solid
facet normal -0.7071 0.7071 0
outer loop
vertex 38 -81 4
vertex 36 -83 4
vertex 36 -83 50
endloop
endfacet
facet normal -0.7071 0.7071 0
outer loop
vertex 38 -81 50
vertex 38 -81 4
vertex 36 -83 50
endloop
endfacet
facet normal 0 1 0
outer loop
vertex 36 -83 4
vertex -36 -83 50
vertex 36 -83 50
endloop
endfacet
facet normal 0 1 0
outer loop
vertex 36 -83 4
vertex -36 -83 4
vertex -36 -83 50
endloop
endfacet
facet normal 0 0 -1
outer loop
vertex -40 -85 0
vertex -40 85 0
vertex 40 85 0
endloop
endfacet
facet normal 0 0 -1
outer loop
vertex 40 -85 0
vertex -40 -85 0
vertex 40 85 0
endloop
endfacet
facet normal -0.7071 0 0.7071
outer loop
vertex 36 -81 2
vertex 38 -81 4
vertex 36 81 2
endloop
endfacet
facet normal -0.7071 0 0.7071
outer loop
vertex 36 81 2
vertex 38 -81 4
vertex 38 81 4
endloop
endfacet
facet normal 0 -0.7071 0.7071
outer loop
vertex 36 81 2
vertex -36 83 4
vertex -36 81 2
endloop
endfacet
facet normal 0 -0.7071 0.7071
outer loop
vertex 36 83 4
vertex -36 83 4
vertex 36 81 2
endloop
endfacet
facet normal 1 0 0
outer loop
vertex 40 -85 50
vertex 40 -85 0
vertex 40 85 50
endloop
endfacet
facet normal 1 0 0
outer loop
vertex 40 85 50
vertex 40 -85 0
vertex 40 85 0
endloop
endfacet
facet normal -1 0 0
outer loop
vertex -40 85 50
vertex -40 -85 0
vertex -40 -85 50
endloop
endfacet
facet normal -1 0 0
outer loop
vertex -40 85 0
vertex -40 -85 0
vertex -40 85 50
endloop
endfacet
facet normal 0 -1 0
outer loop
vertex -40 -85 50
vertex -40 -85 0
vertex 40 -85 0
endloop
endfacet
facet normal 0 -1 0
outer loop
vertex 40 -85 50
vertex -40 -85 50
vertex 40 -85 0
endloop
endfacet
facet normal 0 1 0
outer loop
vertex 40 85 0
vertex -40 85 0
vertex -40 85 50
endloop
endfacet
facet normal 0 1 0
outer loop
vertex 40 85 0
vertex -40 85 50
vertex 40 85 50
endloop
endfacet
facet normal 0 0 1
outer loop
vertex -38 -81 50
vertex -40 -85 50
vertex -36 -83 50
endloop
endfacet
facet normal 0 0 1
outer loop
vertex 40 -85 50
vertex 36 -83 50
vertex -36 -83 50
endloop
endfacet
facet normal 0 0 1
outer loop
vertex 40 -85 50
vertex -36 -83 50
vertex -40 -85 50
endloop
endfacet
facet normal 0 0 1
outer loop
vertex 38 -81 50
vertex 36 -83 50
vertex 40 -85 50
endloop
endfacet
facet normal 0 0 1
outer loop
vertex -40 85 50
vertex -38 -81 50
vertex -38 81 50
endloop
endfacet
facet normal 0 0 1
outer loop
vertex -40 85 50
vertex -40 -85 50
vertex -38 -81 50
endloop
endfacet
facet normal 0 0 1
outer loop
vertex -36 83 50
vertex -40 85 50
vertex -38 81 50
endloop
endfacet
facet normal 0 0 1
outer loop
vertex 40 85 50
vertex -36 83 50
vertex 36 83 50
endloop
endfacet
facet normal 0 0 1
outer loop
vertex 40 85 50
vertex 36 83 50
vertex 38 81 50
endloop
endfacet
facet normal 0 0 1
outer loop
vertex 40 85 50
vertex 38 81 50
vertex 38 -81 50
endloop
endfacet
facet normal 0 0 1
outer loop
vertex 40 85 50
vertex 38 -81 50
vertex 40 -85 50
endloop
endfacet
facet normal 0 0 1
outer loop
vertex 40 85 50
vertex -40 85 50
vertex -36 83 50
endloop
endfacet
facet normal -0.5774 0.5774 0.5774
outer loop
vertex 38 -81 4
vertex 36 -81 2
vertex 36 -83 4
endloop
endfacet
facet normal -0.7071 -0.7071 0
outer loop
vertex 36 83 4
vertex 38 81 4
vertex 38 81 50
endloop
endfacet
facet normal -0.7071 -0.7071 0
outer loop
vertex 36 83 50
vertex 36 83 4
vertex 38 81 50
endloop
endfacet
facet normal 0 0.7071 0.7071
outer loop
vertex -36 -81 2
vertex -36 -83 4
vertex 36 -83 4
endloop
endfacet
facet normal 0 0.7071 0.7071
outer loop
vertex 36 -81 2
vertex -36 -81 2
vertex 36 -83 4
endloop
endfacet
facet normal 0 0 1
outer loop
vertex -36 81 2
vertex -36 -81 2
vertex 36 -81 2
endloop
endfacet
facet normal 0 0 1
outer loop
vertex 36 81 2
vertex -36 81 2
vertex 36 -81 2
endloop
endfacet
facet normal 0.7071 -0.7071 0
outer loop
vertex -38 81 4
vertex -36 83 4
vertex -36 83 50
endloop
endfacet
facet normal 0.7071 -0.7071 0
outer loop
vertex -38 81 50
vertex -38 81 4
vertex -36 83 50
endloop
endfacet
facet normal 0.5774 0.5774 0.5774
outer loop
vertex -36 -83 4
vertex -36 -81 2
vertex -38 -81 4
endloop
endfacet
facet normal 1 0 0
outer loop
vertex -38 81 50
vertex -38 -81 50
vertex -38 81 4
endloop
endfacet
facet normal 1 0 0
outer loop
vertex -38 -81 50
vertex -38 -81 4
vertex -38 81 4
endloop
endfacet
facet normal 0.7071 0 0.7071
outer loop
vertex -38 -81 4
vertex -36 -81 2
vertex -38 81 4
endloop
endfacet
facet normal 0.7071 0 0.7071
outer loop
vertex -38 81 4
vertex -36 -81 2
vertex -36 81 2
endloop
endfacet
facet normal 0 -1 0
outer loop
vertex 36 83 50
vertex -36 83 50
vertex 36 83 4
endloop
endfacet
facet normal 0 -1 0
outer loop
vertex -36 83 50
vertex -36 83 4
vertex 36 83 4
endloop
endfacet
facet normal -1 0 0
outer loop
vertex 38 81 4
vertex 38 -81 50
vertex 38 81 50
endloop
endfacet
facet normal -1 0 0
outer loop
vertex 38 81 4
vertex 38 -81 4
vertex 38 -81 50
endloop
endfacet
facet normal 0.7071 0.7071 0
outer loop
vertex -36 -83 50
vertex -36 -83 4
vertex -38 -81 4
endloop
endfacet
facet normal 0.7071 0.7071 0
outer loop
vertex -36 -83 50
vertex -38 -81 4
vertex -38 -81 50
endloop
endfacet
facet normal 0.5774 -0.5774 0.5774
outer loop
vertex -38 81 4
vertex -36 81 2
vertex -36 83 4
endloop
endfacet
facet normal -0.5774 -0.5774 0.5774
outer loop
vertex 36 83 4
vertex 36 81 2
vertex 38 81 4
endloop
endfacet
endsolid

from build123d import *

# Parameters (mm, degrees)
F1_W     = 80
F1_H     = 170
F1_W_2   = 76
F1_H_2   = 166
F2_DEPTH = 50
F3_DEPTH = 2
F4_SIZE  = 2


with BuildPart() as f2:
    # F1 (on Top) → F2 (new body)
    with BuildSketch(Plane.XY):
        Rectangle(F1_W, F1_H)
        Rectangle(F1_W_2, F1_H_2, mode=Mode.SUBTRACT)
    extrude(amount=F2_DEPTH)

    # F1 (on Top) → F3 (join)
    with BuildSketch(Plane.XY):
        Rectangle(F1_W, F1_H)
        Rectangle(F1_W_2, F1_H_2, mode=Mode.SUBTRACT)
        Rectangle(F1_W_2, F1_H_2)
    extrude(amount=F3_DEPTH)

    # F4
    f4_edges = [f2.edges().sort_by_distance(p)[0] for p in [
        (0, 83, 2),
        (38, 0, 2),
        (-38, 0, 2),
        (0, -83, 2),
        (38, -83, 26),
        (38, 83, 26),
        (-38, 83, 26),
        (-38, -83, 26),
    ]]
    chamfer(f4_edges, length=F4_SIZE)


solid = f2.part
